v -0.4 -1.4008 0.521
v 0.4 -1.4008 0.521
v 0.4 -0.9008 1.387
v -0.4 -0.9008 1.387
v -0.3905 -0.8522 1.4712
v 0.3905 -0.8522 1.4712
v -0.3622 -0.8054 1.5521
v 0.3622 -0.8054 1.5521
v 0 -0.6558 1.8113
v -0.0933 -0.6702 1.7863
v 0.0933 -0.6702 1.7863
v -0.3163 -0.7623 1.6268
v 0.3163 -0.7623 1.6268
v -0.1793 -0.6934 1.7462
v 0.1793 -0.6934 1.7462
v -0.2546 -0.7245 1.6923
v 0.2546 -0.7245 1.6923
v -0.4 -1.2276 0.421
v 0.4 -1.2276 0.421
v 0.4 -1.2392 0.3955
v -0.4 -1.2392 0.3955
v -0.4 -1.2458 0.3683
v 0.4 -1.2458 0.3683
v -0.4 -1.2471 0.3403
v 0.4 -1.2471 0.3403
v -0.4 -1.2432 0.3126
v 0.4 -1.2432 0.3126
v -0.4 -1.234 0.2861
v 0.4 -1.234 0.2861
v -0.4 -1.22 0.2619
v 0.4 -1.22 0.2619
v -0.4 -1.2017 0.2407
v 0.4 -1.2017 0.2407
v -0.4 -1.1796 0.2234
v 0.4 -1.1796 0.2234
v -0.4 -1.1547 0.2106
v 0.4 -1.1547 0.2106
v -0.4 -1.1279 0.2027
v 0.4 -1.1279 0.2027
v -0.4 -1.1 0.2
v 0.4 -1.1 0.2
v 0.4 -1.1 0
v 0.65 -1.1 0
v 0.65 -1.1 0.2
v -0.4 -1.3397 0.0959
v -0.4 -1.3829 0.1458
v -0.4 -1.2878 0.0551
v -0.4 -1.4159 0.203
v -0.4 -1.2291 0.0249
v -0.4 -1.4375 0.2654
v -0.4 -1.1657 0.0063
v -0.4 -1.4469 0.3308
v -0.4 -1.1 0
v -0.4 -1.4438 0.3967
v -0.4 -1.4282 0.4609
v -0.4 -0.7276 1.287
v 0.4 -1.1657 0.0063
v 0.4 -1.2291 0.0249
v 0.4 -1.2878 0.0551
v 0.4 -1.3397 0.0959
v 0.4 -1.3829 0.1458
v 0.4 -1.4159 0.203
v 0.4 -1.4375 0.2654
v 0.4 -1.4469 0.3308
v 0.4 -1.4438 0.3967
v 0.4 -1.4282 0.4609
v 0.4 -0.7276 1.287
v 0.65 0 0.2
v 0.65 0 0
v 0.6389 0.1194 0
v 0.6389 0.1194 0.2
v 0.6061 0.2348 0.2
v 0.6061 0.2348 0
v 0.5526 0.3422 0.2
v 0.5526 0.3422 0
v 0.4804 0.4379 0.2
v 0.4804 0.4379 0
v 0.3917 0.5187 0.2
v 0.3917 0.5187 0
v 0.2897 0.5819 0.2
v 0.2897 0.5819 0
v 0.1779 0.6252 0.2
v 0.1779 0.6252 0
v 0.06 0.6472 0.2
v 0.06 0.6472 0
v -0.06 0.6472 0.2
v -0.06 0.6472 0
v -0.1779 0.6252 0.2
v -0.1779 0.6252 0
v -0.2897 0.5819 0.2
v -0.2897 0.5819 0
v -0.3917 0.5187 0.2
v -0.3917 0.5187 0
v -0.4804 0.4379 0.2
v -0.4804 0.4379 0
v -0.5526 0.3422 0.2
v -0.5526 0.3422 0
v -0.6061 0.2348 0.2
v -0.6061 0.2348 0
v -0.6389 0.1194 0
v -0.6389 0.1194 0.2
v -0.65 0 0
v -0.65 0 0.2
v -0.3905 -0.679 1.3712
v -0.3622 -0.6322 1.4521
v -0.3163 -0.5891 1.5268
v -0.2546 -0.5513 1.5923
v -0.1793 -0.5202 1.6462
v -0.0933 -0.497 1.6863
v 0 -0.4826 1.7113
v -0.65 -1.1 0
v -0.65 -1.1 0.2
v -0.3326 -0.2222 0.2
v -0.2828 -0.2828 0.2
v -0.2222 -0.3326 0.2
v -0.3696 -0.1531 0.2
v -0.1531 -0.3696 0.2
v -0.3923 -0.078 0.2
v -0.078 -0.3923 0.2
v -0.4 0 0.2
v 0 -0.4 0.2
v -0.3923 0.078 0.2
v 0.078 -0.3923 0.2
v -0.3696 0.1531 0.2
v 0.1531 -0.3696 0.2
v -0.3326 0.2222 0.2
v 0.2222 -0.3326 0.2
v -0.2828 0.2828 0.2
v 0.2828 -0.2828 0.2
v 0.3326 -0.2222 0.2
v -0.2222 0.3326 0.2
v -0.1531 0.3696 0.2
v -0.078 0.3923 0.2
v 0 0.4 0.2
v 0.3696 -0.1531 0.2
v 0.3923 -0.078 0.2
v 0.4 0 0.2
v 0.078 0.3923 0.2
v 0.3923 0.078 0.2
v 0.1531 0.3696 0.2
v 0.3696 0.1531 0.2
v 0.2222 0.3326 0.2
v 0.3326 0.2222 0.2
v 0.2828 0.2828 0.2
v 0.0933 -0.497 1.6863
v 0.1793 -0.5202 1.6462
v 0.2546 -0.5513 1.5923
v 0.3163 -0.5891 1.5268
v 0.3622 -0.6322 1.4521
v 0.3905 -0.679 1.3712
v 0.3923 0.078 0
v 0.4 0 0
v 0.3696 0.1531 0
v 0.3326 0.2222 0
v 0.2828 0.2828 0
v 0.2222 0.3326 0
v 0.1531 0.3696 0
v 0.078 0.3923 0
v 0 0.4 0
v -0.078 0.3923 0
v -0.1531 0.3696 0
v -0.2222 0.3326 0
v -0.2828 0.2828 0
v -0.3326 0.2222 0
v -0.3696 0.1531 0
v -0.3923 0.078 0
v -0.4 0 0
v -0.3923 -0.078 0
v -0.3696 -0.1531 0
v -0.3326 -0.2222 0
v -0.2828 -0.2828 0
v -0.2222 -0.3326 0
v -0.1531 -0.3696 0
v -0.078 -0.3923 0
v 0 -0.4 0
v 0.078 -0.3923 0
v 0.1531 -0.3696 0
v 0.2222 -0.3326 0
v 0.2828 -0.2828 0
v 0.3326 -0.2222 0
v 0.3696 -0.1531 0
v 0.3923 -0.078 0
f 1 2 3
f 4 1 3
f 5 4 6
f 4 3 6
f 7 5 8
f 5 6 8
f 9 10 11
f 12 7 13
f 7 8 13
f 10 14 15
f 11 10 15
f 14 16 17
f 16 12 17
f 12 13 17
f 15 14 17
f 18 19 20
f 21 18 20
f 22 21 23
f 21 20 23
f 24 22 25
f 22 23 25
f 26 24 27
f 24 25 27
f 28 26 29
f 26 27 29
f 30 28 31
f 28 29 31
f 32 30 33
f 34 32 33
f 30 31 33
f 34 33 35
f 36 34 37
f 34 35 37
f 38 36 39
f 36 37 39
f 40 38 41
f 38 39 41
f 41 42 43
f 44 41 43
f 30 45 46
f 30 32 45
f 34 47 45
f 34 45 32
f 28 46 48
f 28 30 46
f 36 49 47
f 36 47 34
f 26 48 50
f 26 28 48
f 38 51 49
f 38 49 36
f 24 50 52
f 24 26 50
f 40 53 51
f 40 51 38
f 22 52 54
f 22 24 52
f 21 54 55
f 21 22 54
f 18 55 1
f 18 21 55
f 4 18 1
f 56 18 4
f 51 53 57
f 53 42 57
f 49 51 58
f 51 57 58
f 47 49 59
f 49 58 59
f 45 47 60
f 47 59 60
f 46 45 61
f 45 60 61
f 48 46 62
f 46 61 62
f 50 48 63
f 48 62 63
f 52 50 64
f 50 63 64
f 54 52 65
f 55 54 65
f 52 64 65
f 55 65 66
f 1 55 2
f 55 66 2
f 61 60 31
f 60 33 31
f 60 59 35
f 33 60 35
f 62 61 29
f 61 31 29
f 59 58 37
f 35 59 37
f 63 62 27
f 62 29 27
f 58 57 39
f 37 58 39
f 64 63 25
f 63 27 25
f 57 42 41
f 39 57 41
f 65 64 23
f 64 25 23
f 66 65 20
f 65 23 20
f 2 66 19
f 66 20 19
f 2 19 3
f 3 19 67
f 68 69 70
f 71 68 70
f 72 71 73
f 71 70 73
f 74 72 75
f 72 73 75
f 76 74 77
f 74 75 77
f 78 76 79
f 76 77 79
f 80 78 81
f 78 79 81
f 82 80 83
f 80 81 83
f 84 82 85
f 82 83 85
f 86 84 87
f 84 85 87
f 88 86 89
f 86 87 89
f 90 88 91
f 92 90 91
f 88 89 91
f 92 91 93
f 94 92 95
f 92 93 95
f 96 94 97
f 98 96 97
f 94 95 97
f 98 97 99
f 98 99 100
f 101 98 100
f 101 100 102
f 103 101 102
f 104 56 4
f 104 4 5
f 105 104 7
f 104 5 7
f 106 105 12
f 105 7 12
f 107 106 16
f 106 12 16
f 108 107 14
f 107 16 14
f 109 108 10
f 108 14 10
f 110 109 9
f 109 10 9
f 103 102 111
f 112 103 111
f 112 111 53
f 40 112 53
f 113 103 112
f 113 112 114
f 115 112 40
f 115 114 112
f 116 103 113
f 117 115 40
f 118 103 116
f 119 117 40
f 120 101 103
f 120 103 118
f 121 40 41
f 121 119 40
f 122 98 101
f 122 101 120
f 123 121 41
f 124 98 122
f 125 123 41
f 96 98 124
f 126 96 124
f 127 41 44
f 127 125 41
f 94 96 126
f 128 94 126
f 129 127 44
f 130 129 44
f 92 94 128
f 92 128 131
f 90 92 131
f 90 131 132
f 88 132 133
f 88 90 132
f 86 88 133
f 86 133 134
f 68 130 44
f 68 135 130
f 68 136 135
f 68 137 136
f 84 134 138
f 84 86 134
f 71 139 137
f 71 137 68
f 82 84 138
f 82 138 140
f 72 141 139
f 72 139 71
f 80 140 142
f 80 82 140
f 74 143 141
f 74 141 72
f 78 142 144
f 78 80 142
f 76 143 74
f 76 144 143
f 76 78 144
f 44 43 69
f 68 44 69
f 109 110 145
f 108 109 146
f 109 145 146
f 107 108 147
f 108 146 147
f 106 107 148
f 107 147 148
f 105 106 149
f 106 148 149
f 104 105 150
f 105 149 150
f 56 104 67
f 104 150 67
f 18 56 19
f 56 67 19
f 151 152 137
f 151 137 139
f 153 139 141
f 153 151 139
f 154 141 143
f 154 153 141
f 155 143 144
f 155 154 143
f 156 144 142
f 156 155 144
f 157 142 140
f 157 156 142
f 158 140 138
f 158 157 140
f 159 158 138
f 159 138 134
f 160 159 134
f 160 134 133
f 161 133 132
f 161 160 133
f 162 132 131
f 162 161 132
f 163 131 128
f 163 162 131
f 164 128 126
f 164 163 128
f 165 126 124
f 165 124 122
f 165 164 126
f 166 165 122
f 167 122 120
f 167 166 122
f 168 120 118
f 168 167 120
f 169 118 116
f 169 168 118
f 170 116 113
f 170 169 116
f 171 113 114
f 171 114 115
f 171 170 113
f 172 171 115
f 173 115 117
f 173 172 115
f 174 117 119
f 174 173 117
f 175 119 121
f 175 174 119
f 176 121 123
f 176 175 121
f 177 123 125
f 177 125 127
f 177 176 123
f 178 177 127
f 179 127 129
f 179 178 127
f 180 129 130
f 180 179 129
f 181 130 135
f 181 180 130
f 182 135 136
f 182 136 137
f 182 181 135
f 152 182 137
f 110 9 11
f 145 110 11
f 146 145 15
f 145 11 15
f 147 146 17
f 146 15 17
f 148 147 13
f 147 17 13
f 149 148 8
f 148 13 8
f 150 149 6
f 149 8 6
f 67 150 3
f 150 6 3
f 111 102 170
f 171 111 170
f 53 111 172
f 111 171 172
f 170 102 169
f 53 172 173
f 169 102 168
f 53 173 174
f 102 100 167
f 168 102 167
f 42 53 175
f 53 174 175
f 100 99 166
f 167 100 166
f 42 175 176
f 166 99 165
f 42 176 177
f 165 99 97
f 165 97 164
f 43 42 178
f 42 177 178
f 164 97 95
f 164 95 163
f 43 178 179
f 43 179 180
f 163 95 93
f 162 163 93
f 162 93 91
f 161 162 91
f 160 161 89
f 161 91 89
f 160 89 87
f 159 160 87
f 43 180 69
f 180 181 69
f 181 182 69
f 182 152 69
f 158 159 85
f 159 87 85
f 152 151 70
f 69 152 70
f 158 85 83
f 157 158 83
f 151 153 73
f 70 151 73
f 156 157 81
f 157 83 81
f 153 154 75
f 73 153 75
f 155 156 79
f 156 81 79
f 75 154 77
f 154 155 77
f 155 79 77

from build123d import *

# Parameters (mm, degrees)
SKETCH1_R           = 0.4
BOSS_EXTRUDE1_DEPTH = 0.2
BOSS_EXTRUDE2_DEPTH = 0.4
FILLET2_R           = 0.5


with BuildPart() as part:
    # Sketch1 → Boss-Extrude1 (new body)
    with BuildSketch(Plane.XY):
        with BuildLine():
            Line((-0.65, 0), (-0.65, -1.1))
            Line((-0.65, -1.1), (0.65, -1.1))
            Line((0.65, -1.1), (0.65, 0))
            ThreePointArc((0.65, 0), (0, 0.65), (-0.65, 0))
        make_face()
        Circle(SKETCH1_R, mode=Mode.SUBTRACT)
    extrude(amount=BOSS_EXTRUDE1_DEPTH)

    # Sketch2 → Boss-Extrude2 (add, symmetric)
    with BuildSketch(Plane(origin=(0, 0, 0), x_dir=(0, 0, -1), z_dir=(1, 0, 0))):
        with BuildLine():
            Line((-0.2, -1.1), (0, -1.1))
            ThreePointArc((0, -1.1), (-0.173653965, -1.40077749), (-0.520961894, -1.40077749))
            Line((-0.520961894, -1.40077749), (-1.82, -0.65077749))
            Line((-1.82, -0.65077749), (-1.72, -0.477572409))
            Line((-1.72, -0.477572409), (-0.420961894, -1.227572409))
            ThreePointArc((-0.420961894, -1.227572409), (-0.273653965, -1.227572409), (-0.2, -1.1))
        make_face()
    extrude(amount=BOSS_EXTRUDE2_DEPTH, both=True)

    # Fillet2
    # the kernel refuses this fillet: 0.5 mm, written as the material it takes off along each edge
    with BuildSketch(Plane(origin=(0.4, -1.733309245, 2.445), x_dir=(-1, 0, 0), z_dir=(0, 0.86602540378444, -0.49999999999999756)), Plane(origin=(-0.4, -1.733309245, 2.445), x_dir=(0, -0.49999999999999756, -0.86602540378444), z_dir=(0, 0.86602540378444, -0.49999999999999756))) as fillet2_piece_1:
        with BuildLine():
            CenterArc((FILLET2_R, -FILLET2_R), FILLET2_R, 90, 90)
            Line((0, -FILLET2_R), (0, 0))
            Line((0, 0), (FILLET2_R, 0))
        make_face()
    extrude(amount=2.7, mode=Mode.SUBTRACT)


solid = part.part
